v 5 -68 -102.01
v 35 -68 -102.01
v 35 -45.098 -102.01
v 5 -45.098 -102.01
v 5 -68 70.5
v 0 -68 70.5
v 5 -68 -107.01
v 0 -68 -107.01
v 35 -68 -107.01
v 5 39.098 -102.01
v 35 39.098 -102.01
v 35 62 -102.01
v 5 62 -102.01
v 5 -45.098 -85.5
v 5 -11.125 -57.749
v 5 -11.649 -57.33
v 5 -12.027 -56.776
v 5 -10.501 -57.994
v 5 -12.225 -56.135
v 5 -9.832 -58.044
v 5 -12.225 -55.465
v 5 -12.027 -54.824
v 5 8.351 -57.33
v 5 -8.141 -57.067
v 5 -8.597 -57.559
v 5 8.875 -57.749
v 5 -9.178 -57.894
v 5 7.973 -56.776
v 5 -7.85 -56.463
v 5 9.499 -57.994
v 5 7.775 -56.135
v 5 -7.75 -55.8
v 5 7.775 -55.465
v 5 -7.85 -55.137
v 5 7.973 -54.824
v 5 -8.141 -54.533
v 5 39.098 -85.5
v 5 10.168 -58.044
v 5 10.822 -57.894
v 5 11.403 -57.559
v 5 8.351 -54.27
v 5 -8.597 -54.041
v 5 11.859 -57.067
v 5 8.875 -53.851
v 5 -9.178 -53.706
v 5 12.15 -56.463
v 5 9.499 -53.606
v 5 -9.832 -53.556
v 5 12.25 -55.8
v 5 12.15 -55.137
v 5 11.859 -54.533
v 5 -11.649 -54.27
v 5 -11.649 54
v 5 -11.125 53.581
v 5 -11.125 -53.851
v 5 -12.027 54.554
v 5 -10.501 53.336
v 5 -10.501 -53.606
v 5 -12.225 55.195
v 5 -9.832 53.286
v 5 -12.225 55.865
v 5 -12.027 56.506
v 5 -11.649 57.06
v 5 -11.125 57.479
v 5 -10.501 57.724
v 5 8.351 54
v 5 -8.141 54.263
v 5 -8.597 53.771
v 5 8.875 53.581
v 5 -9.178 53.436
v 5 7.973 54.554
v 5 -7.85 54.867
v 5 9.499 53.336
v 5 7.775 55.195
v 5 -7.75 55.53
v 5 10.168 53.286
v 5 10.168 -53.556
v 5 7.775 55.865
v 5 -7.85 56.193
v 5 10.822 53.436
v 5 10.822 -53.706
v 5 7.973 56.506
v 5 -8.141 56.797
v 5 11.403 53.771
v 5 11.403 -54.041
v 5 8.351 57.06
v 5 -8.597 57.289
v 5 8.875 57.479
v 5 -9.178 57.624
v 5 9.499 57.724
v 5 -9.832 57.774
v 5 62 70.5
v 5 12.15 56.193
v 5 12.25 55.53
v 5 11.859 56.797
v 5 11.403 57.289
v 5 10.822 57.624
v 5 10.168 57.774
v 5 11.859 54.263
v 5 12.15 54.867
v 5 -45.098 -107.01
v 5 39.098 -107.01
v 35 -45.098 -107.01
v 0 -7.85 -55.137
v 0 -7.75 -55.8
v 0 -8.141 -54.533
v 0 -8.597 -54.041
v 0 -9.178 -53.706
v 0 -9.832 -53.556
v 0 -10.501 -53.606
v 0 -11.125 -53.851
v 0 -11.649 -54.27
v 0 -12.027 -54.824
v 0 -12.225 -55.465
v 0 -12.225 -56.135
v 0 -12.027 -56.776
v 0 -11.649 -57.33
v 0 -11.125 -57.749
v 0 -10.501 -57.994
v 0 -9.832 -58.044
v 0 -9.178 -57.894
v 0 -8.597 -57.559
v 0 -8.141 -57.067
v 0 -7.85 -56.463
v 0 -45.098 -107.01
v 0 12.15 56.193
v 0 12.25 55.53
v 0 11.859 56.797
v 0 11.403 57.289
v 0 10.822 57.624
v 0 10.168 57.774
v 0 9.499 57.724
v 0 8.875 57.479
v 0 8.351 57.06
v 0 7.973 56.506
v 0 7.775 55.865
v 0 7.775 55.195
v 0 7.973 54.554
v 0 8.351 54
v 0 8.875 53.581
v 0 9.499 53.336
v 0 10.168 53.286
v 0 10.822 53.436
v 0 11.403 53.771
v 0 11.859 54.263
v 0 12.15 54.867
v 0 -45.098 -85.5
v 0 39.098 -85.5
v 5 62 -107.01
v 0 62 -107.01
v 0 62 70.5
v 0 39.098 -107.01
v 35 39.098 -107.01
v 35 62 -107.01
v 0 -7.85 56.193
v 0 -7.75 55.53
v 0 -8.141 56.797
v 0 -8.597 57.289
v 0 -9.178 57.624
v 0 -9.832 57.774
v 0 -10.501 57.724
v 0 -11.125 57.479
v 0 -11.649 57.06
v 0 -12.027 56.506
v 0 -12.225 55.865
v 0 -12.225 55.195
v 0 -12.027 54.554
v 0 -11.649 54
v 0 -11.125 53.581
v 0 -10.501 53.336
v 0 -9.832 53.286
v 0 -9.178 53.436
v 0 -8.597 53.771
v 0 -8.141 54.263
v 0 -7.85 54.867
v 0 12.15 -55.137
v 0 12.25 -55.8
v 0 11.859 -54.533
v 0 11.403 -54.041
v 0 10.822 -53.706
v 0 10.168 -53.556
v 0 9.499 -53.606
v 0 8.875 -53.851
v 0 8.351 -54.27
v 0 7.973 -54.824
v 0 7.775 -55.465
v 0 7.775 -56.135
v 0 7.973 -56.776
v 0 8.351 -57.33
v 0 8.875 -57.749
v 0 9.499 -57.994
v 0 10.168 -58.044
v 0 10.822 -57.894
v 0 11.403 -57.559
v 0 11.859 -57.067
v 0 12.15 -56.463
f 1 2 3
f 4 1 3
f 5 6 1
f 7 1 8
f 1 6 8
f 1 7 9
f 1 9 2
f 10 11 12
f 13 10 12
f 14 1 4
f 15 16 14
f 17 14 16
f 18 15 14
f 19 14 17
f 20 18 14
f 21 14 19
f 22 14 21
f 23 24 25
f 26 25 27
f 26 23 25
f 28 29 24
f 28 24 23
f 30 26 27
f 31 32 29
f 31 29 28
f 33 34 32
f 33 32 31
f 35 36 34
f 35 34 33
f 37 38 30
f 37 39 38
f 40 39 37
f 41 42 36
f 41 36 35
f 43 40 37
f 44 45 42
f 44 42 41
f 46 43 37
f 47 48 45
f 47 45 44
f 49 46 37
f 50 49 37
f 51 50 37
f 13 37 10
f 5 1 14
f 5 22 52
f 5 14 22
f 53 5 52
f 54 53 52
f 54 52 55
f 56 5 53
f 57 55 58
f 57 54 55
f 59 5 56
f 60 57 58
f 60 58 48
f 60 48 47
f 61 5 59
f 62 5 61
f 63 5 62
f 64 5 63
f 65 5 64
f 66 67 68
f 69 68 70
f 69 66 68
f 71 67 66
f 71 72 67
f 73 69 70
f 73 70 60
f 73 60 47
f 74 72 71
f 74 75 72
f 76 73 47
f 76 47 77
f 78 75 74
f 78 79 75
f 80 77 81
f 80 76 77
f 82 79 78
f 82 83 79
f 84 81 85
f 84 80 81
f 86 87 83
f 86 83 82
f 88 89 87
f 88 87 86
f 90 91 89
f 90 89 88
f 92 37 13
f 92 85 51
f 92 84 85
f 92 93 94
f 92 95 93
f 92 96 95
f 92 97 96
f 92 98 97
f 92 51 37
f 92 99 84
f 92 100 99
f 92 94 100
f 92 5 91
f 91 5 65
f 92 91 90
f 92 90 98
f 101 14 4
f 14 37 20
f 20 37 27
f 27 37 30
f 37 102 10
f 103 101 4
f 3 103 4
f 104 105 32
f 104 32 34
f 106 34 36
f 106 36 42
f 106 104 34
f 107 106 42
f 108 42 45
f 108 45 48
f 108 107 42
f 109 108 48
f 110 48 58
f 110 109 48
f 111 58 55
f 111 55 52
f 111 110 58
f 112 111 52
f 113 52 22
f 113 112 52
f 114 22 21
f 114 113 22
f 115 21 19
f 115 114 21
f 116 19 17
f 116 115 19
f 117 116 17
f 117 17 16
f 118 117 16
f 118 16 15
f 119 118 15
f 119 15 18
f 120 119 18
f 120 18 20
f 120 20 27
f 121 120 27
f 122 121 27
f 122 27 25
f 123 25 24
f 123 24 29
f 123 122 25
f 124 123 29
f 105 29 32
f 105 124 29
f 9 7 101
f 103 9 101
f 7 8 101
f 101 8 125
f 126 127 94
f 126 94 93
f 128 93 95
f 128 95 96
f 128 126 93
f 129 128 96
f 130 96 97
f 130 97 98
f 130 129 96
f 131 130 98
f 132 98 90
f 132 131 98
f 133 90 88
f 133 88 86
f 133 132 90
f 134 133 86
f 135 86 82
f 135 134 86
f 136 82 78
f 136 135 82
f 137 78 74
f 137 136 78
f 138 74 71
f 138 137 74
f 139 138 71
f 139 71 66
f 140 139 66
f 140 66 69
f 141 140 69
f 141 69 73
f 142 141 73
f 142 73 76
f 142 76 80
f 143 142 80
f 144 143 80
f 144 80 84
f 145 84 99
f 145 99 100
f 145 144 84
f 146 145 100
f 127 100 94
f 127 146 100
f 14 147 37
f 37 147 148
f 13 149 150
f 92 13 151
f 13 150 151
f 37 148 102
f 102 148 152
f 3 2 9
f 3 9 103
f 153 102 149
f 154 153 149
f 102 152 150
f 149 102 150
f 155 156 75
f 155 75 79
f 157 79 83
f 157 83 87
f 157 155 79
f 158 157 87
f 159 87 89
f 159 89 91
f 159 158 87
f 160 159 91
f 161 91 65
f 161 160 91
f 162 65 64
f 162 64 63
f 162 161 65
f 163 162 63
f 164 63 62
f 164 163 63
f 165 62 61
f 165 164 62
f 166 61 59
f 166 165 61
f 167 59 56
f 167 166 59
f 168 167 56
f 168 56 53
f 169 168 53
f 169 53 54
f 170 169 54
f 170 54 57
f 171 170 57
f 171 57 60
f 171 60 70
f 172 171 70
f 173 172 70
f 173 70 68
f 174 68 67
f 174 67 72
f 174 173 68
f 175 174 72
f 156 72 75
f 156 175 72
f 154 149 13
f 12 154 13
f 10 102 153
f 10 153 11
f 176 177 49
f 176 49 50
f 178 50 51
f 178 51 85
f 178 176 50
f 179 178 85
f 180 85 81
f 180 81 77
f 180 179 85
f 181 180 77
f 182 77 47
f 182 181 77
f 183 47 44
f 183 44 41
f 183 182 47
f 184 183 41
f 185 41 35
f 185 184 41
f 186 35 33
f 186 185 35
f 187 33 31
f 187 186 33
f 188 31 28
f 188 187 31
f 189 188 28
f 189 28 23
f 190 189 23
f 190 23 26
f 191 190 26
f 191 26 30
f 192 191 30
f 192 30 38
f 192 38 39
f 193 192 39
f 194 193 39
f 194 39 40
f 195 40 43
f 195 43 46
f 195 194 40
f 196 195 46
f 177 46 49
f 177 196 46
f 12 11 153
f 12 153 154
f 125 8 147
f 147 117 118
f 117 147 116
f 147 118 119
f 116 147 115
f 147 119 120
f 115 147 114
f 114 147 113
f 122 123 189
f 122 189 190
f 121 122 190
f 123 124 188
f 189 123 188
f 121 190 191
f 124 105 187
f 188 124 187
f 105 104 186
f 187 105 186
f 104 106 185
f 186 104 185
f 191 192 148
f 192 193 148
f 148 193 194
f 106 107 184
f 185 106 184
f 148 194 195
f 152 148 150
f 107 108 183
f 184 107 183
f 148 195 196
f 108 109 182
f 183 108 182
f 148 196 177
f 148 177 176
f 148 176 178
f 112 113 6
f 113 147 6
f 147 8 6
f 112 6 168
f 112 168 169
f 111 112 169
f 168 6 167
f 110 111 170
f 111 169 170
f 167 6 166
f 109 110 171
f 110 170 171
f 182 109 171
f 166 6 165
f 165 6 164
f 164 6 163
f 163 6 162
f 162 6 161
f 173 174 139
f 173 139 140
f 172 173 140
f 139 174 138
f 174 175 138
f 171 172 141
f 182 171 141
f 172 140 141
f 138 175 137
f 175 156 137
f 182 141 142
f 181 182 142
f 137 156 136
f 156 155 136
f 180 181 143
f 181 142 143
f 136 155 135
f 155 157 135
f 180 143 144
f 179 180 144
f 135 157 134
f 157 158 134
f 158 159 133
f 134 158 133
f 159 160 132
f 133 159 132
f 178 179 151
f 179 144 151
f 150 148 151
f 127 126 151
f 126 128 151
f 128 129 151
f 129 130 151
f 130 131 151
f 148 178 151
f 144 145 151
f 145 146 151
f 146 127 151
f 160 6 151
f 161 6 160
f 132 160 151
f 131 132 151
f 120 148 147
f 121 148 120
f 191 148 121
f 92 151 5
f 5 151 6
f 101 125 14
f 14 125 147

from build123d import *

# Parameters (mm, degrees)
F0_R     = 2.25
F1_DEPTH = 5
F2_W     = 22.901535
F2_H     = 5
F3_DEPTH = 30


with BuildPart() as f1:
    # F0 (on Right) → F1 (new body)
    with BuildSketch(Plane.YZ):
        Polygon((62, 70.5), (-68, 70.5), (-68, -85.5), (-68, -107.009701), (-45.098465, -107.009701), (-45.098465, -85.5), (39.098465, -85.5), (39.098465, -107.009701), (62, -107.009701), (62, -85.5), align=None)
        with Locations((-10, -55.8)):
            Circle(F0_R, mode=Mode.SUBTRACT)
        with Locations((10, -55.8)):
            Circle(F0_R, mode=Mode.SUBTRACT)
        with Locations((-10, 55.53)):
            Circle(F0_R, mode=Mode.SUBTRACT)
        with Locations((10, 55.53)):
            Circle(F0_R, mode=Mode.SUBTRACT)
    extrude(amount=F1_DEPTH)

    # F2 (on face) → F3 (join)
    with BuildSketch(Plane.YZ.offset(5)):
        with Locations((-56.549233, -104.509701)):
            Rectangle(F2_W, F2_H)
        with Locations((50.549233, -104.509701)):
            Rectangle(F2_W, F2_H)
    extrude(amount=F3_DEPTH)


solid = f1.part
